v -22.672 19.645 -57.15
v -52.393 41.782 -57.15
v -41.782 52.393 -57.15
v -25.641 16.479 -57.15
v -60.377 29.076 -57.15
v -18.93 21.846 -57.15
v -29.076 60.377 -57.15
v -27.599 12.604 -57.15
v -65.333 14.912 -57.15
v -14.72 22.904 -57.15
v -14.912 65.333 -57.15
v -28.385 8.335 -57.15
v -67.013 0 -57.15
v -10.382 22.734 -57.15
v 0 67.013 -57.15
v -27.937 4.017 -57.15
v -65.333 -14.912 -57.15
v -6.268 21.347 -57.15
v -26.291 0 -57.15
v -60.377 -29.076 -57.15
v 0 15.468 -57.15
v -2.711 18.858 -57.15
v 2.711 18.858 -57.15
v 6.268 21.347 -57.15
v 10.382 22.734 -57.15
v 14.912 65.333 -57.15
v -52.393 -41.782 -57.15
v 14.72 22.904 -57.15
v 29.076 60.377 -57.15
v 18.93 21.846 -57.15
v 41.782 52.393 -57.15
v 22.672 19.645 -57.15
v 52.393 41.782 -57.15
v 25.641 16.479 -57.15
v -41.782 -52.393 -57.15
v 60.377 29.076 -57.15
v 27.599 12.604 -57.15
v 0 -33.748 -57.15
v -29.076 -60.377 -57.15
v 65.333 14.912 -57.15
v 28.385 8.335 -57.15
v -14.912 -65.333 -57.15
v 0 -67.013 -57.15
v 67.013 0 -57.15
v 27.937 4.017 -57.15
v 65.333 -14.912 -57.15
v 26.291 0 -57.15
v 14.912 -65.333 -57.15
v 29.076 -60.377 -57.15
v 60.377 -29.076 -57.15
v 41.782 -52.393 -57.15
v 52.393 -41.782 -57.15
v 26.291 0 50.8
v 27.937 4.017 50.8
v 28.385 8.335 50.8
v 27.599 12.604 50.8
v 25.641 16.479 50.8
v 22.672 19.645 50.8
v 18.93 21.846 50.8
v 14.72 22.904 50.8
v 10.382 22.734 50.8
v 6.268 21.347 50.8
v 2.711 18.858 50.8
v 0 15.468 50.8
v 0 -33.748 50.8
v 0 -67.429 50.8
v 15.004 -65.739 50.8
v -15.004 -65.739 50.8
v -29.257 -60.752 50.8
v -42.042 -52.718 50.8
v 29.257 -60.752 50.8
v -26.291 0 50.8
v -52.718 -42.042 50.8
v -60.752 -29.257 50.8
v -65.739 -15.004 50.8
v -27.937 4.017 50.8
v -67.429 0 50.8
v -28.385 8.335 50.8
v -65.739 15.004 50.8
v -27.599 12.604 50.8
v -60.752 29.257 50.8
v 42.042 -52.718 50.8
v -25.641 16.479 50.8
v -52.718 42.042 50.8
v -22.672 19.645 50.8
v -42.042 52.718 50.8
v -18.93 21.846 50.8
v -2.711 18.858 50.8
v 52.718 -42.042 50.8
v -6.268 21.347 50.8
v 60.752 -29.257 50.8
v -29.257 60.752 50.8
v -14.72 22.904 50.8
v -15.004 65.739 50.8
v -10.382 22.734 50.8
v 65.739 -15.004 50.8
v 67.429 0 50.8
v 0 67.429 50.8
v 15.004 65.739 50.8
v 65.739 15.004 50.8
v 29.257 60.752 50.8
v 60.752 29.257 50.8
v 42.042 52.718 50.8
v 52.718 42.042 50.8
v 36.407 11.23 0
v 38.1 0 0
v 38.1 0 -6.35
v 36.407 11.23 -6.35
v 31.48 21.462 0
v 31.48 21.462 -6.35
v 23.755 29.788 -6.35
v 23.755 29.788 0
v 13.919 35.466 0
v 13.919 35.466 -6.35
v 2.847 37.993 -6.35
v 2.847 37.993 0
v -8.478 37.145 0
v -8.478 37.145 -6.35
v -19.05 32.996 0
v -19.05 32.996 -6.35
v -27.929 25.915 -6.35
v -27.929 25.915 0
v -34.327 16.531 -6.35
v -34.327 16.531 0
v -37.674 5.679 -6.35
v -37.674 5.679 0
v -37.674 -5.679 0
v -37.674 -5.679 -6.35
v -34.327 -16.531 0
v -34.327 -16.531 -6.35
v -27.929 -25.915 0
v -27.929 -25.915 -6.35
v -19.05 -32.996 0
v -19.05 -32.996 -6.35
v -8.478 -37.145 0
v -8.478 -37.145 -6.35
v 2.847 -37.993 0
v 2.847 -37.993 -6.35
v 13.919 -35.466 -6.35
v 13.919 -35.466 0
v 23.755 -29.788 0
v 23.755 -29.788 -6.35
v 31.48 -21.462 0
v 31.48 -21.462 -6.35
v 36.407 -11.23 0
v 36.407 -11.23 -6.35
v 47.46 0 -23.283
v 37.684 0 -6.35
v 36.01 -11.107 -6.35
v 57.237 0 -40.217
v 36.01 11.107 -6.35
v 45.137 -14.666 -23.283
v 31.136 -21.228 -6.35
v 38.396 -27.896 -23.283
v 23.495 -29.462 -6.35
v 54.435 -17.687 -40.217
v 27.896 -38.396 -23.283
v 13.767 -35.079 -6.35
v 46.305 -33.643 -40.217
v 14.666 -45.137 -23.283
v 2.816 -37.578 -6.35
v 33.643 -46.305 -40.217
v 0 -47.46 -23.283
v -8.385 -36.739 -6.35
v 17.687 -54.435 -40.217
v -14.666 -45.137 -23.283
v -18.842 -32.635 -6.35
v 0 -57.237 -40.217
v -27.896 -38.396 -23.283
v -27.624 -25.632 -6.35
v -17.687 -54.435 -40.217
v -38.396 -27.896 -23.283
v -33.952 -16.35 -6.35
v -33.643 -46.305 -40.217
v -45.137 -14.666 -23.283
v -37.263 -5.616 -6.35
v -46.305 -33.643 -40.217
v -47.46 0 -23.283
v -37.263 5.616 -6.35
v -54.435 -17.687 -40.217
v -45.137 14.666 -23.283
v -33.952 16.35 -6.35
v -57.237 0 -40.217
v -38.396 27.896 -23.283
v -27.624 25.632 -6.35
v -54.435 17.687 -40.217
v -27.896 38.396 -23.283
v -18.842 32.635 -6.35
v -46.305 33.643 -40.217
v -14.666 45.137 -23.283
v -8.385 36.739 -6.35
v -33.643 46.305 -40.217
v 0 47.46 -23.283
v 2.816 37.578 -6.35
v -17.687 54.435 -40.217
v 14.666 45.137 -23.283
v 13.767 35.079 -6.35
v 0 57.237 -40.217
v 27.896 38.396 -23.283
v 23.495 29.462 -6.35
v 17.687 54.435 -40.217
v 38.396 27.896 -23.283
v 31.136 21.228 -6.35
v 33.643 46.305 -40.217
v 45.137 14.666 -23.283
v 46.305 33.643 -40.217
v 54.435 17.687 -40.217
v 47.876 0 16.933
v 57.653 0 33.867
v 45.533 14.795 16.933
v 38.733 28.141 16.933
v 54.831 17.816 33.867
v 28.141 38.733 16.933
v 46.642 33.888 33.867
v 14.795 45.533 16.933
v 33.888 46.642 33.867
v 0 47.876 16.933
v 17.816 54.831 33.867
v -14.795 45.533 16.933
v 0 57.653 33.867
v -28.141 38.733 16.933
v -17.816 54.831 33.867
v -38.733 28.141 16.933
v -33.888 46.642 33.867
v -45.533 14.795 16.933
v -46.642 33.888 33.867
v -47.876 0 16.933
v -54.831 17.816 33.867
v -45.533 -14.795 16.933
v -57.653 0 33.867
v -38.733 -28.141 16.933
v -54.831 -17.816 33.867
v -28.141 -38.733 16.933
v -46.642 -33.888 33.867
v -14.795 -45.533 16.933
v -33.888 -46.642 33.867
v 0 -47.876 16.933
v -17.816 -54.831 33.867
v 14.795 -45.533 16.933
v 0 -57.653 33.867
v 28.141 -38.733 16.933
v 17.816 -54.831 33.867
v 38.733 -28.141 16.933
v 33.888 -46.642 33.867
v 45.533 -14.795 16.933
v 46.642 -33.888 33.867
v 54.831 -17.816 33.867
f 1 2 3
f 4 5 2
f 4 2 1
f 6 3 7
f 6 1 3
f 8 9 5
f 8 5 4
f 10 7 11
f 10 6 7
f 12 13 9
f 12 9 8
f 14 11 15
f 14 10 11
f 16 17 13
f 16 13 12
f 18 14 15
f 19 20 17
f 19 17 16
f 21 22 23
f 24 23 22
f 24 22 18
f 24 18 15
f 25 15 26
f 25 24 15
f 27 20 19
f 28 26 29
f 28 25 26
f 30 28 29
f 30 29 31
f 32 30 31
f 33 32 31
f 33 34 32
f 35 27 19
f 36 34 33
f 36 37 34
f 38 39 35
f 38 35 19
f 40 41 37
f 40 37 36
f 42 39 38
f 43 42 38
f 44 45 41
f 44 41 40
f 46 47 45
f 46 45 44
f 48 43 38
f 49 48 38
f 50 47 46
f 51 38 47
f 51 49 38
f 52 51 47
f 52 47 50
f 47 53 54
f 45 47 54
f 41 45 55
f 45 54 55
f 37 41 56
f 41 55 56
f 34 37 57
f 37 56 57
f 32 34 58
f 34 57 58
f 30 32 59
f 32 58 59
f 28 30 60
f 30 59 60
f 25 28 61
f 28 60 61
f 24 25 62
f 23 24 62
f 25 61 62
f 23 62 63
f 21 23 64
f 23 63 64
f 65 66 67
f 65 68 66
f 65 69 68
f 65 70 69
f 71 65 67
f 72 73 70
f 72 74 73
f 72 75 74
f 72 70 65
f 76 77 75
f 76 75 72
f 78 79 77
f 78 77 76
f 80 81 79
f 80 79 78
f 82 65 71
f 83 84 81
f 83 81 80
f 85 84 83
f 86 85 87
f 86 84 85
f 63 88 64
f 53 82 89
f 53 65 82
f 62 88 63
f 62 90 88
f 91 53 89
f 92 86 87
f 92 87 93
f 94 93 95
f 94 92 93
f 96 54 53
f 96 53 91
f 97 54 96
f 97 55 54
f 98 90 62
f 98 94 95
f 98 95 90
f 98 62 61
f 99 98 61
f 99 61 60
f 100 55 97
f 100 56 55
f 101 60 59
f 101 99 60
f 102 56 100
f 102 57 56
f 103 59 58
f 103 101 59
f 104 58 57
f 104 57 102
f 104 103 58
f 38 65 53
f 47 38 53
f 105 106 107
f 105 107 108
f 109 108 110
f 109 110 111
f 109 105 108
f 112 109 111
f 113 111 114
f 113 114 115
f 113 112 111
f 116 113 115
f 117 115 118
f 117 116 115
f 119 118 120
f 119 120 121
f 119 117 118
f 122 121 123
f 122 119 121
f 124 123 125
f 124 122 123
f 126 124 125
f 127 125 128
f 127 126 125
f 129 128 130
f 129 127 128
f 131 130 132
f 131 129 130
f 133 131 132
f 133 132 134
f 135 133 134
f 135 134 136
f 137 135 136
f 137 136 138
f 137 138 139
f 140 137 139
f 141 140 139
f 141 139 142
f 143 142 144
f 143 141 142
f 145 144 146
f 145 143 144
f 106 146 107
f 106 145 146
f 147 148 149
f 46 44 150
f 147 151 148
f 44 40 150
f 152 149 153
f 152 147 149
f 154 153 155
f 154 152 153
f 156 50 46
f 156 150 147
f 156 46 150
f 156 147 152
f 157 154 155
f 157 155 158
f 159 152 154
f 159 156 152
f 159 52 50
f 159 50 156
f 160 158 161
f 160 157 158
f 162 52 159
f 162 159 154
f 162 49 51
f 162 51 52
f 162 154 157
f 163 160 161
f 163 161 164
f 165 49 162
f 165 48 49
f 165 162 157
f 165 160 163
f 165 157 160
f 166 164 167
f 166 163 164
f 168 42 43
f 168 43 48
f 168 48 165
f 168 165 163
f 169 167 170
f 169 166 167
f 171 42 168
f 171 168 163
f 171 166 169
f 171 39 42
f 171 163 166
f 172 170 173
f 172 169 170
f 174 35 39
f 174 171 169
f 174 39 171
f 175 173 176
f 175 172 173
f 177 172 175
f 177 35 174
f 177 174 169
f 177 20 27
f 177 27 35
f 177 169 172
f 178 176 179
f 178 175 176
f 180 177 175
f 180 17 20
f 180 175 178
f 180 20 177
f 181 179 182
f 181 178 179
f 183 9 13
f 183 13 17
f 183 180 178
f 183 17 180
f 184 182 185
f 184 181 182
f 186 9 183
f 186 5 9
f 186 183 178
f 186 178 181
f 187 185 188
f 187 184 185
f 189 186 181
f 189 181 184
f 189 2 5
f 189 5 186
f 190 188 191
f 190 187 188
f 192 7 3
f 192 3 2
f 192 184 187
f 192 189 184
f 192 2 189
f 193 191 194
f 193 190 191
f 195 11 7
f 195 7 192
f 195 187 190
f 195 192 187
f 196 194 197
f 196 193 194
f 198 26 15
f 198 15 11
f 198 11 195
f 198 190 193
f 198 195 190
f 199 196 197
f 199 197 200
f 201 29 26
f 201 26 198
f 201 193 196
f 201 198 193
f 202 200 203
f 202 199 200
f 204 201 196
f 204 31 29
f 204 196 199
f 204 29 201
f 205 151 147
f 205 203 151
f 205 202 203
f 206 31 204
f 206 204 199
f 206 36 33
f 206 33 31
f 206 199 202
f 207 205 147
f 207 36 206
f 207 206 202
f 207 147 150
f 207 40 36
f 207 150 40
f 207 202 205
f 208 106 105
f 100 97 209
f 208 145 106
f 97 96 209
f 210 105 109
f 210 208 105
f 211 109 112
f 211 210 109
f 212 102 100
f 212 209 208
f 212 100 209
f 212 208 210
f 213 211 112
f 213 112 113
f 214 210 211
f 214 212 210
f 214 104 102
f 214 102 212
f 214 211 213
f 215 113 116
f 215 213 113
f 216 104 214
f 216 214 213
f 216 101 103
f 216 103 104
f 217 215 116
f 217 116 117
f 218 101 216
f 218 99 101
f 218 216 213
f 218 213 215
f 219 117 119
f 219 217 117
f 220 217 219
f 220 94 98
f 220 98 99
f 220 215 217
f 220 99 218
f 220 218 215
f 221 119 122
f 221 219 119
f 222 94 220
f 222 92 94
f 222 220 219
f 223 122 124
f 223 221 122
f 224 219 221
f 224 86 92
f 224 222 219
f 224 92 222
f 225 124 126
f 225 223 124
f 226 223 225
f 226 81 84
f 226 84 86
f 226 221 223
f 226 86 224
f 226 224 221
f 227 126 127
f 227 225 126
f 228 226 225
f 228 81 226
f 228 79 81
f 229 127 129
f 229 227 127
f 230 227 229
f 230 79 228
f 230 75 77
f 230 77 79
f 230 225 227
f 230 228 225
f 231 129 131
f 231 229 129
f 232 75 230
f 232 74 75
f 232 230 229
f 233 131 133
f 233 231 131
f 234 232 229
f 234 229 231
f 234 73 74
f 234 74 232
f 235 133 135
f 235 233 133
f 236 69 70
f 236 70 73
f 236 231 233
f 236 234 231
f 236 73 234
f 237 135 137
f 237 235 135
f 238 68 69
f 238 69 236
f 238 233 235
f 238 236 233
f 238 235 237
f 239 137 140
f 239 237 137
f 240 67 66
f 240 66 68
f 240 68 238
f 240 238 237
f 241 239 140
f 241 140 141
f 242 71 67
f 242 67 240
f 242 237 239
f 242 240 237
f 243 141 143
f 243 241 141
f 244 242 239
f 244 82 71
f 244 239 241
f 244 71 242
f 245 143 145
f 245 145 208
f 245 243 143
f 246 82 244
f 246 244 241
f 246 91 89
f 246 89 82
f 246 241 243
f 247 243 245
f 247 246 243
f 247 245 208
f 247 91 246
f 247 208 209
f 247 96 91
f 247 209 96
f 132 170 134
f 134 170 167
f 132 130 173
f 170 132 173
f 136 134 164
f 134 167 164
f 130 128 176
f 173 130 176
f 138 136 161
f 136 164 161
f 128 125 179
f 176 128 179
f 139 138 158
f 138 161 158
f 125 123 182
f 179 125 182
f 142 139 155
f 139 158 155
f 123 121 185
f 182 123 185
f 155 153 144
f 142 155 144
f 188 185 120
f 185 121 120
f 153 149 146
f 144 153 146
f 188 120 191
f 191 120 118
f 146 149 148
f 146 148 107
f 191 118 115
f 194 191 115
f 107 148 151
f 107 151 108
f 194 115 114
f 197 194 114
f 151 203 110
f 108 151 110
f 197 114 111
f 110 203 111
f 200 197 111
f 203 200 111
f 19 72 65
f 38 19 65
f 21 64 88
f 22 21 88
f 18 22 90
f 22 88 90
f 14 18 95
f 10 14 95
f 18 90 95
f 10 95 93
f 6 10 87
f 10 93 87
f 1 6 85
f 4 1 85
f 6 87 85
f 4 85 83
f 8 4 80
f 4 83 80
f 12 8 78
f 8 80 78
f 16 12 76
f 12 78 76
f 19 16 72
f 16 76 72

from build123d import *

# Parameters (mm, degrees)
F0_R     = 38.1
F1_DEPTH = 50.8
F1_TAPER = -30
F2_DEPTH = 6.35
F3_R     = 37.6838107833
F4_DEPTH = 50.8
F4_TAPER = -30
F6_DEPTH = 127


with BuildPart() as f1:
    # F0 (on Top) → F1 (new body)
    with BuildSketch(Plane.XY):
        Circle(F0_R)
    extrude(amount=F1_DEPTH, taper=F1_TAPER)

    # F0 (on Top) → F2 (join)
    with BuildSketch(Plane.XY):
        Circle(F0_R)
    extrude(amount=-F2_DEPTH)

    # F3 (on face) → F4 (join)
    with BuildSketch(Plane(origin=(0, 0, -6.35), x_dir=(1, 0, 0), z_dir=(0, 0, -1))):
        Circle(F3_R)
    extrude(amount=F4_DEPTH, taper=F4_TAPER)

    # F5 (on face) → F6 (cut)
    with BuildSketch(Plane.XY.offset(50.8)):
        with BuildLine():
            Line((-26.2908060104, 0), (0, -33.7482951581))
            Line((0, -33.7482951581), (26.2908060104, 0))
            ThreePointArc((26.2908060104, 0), (20.8795288063, 20.8795288063), (0, 15.4682516023))
            ThreePointArc((0, 15.4682516023), (-20.8795288063, 20.8795288063), (-26.2908060104, 0))
        make_face()
    extrude(amount=-F6_DEPTH, mode=Mode.SUBTRACT)


solid = f1.part
